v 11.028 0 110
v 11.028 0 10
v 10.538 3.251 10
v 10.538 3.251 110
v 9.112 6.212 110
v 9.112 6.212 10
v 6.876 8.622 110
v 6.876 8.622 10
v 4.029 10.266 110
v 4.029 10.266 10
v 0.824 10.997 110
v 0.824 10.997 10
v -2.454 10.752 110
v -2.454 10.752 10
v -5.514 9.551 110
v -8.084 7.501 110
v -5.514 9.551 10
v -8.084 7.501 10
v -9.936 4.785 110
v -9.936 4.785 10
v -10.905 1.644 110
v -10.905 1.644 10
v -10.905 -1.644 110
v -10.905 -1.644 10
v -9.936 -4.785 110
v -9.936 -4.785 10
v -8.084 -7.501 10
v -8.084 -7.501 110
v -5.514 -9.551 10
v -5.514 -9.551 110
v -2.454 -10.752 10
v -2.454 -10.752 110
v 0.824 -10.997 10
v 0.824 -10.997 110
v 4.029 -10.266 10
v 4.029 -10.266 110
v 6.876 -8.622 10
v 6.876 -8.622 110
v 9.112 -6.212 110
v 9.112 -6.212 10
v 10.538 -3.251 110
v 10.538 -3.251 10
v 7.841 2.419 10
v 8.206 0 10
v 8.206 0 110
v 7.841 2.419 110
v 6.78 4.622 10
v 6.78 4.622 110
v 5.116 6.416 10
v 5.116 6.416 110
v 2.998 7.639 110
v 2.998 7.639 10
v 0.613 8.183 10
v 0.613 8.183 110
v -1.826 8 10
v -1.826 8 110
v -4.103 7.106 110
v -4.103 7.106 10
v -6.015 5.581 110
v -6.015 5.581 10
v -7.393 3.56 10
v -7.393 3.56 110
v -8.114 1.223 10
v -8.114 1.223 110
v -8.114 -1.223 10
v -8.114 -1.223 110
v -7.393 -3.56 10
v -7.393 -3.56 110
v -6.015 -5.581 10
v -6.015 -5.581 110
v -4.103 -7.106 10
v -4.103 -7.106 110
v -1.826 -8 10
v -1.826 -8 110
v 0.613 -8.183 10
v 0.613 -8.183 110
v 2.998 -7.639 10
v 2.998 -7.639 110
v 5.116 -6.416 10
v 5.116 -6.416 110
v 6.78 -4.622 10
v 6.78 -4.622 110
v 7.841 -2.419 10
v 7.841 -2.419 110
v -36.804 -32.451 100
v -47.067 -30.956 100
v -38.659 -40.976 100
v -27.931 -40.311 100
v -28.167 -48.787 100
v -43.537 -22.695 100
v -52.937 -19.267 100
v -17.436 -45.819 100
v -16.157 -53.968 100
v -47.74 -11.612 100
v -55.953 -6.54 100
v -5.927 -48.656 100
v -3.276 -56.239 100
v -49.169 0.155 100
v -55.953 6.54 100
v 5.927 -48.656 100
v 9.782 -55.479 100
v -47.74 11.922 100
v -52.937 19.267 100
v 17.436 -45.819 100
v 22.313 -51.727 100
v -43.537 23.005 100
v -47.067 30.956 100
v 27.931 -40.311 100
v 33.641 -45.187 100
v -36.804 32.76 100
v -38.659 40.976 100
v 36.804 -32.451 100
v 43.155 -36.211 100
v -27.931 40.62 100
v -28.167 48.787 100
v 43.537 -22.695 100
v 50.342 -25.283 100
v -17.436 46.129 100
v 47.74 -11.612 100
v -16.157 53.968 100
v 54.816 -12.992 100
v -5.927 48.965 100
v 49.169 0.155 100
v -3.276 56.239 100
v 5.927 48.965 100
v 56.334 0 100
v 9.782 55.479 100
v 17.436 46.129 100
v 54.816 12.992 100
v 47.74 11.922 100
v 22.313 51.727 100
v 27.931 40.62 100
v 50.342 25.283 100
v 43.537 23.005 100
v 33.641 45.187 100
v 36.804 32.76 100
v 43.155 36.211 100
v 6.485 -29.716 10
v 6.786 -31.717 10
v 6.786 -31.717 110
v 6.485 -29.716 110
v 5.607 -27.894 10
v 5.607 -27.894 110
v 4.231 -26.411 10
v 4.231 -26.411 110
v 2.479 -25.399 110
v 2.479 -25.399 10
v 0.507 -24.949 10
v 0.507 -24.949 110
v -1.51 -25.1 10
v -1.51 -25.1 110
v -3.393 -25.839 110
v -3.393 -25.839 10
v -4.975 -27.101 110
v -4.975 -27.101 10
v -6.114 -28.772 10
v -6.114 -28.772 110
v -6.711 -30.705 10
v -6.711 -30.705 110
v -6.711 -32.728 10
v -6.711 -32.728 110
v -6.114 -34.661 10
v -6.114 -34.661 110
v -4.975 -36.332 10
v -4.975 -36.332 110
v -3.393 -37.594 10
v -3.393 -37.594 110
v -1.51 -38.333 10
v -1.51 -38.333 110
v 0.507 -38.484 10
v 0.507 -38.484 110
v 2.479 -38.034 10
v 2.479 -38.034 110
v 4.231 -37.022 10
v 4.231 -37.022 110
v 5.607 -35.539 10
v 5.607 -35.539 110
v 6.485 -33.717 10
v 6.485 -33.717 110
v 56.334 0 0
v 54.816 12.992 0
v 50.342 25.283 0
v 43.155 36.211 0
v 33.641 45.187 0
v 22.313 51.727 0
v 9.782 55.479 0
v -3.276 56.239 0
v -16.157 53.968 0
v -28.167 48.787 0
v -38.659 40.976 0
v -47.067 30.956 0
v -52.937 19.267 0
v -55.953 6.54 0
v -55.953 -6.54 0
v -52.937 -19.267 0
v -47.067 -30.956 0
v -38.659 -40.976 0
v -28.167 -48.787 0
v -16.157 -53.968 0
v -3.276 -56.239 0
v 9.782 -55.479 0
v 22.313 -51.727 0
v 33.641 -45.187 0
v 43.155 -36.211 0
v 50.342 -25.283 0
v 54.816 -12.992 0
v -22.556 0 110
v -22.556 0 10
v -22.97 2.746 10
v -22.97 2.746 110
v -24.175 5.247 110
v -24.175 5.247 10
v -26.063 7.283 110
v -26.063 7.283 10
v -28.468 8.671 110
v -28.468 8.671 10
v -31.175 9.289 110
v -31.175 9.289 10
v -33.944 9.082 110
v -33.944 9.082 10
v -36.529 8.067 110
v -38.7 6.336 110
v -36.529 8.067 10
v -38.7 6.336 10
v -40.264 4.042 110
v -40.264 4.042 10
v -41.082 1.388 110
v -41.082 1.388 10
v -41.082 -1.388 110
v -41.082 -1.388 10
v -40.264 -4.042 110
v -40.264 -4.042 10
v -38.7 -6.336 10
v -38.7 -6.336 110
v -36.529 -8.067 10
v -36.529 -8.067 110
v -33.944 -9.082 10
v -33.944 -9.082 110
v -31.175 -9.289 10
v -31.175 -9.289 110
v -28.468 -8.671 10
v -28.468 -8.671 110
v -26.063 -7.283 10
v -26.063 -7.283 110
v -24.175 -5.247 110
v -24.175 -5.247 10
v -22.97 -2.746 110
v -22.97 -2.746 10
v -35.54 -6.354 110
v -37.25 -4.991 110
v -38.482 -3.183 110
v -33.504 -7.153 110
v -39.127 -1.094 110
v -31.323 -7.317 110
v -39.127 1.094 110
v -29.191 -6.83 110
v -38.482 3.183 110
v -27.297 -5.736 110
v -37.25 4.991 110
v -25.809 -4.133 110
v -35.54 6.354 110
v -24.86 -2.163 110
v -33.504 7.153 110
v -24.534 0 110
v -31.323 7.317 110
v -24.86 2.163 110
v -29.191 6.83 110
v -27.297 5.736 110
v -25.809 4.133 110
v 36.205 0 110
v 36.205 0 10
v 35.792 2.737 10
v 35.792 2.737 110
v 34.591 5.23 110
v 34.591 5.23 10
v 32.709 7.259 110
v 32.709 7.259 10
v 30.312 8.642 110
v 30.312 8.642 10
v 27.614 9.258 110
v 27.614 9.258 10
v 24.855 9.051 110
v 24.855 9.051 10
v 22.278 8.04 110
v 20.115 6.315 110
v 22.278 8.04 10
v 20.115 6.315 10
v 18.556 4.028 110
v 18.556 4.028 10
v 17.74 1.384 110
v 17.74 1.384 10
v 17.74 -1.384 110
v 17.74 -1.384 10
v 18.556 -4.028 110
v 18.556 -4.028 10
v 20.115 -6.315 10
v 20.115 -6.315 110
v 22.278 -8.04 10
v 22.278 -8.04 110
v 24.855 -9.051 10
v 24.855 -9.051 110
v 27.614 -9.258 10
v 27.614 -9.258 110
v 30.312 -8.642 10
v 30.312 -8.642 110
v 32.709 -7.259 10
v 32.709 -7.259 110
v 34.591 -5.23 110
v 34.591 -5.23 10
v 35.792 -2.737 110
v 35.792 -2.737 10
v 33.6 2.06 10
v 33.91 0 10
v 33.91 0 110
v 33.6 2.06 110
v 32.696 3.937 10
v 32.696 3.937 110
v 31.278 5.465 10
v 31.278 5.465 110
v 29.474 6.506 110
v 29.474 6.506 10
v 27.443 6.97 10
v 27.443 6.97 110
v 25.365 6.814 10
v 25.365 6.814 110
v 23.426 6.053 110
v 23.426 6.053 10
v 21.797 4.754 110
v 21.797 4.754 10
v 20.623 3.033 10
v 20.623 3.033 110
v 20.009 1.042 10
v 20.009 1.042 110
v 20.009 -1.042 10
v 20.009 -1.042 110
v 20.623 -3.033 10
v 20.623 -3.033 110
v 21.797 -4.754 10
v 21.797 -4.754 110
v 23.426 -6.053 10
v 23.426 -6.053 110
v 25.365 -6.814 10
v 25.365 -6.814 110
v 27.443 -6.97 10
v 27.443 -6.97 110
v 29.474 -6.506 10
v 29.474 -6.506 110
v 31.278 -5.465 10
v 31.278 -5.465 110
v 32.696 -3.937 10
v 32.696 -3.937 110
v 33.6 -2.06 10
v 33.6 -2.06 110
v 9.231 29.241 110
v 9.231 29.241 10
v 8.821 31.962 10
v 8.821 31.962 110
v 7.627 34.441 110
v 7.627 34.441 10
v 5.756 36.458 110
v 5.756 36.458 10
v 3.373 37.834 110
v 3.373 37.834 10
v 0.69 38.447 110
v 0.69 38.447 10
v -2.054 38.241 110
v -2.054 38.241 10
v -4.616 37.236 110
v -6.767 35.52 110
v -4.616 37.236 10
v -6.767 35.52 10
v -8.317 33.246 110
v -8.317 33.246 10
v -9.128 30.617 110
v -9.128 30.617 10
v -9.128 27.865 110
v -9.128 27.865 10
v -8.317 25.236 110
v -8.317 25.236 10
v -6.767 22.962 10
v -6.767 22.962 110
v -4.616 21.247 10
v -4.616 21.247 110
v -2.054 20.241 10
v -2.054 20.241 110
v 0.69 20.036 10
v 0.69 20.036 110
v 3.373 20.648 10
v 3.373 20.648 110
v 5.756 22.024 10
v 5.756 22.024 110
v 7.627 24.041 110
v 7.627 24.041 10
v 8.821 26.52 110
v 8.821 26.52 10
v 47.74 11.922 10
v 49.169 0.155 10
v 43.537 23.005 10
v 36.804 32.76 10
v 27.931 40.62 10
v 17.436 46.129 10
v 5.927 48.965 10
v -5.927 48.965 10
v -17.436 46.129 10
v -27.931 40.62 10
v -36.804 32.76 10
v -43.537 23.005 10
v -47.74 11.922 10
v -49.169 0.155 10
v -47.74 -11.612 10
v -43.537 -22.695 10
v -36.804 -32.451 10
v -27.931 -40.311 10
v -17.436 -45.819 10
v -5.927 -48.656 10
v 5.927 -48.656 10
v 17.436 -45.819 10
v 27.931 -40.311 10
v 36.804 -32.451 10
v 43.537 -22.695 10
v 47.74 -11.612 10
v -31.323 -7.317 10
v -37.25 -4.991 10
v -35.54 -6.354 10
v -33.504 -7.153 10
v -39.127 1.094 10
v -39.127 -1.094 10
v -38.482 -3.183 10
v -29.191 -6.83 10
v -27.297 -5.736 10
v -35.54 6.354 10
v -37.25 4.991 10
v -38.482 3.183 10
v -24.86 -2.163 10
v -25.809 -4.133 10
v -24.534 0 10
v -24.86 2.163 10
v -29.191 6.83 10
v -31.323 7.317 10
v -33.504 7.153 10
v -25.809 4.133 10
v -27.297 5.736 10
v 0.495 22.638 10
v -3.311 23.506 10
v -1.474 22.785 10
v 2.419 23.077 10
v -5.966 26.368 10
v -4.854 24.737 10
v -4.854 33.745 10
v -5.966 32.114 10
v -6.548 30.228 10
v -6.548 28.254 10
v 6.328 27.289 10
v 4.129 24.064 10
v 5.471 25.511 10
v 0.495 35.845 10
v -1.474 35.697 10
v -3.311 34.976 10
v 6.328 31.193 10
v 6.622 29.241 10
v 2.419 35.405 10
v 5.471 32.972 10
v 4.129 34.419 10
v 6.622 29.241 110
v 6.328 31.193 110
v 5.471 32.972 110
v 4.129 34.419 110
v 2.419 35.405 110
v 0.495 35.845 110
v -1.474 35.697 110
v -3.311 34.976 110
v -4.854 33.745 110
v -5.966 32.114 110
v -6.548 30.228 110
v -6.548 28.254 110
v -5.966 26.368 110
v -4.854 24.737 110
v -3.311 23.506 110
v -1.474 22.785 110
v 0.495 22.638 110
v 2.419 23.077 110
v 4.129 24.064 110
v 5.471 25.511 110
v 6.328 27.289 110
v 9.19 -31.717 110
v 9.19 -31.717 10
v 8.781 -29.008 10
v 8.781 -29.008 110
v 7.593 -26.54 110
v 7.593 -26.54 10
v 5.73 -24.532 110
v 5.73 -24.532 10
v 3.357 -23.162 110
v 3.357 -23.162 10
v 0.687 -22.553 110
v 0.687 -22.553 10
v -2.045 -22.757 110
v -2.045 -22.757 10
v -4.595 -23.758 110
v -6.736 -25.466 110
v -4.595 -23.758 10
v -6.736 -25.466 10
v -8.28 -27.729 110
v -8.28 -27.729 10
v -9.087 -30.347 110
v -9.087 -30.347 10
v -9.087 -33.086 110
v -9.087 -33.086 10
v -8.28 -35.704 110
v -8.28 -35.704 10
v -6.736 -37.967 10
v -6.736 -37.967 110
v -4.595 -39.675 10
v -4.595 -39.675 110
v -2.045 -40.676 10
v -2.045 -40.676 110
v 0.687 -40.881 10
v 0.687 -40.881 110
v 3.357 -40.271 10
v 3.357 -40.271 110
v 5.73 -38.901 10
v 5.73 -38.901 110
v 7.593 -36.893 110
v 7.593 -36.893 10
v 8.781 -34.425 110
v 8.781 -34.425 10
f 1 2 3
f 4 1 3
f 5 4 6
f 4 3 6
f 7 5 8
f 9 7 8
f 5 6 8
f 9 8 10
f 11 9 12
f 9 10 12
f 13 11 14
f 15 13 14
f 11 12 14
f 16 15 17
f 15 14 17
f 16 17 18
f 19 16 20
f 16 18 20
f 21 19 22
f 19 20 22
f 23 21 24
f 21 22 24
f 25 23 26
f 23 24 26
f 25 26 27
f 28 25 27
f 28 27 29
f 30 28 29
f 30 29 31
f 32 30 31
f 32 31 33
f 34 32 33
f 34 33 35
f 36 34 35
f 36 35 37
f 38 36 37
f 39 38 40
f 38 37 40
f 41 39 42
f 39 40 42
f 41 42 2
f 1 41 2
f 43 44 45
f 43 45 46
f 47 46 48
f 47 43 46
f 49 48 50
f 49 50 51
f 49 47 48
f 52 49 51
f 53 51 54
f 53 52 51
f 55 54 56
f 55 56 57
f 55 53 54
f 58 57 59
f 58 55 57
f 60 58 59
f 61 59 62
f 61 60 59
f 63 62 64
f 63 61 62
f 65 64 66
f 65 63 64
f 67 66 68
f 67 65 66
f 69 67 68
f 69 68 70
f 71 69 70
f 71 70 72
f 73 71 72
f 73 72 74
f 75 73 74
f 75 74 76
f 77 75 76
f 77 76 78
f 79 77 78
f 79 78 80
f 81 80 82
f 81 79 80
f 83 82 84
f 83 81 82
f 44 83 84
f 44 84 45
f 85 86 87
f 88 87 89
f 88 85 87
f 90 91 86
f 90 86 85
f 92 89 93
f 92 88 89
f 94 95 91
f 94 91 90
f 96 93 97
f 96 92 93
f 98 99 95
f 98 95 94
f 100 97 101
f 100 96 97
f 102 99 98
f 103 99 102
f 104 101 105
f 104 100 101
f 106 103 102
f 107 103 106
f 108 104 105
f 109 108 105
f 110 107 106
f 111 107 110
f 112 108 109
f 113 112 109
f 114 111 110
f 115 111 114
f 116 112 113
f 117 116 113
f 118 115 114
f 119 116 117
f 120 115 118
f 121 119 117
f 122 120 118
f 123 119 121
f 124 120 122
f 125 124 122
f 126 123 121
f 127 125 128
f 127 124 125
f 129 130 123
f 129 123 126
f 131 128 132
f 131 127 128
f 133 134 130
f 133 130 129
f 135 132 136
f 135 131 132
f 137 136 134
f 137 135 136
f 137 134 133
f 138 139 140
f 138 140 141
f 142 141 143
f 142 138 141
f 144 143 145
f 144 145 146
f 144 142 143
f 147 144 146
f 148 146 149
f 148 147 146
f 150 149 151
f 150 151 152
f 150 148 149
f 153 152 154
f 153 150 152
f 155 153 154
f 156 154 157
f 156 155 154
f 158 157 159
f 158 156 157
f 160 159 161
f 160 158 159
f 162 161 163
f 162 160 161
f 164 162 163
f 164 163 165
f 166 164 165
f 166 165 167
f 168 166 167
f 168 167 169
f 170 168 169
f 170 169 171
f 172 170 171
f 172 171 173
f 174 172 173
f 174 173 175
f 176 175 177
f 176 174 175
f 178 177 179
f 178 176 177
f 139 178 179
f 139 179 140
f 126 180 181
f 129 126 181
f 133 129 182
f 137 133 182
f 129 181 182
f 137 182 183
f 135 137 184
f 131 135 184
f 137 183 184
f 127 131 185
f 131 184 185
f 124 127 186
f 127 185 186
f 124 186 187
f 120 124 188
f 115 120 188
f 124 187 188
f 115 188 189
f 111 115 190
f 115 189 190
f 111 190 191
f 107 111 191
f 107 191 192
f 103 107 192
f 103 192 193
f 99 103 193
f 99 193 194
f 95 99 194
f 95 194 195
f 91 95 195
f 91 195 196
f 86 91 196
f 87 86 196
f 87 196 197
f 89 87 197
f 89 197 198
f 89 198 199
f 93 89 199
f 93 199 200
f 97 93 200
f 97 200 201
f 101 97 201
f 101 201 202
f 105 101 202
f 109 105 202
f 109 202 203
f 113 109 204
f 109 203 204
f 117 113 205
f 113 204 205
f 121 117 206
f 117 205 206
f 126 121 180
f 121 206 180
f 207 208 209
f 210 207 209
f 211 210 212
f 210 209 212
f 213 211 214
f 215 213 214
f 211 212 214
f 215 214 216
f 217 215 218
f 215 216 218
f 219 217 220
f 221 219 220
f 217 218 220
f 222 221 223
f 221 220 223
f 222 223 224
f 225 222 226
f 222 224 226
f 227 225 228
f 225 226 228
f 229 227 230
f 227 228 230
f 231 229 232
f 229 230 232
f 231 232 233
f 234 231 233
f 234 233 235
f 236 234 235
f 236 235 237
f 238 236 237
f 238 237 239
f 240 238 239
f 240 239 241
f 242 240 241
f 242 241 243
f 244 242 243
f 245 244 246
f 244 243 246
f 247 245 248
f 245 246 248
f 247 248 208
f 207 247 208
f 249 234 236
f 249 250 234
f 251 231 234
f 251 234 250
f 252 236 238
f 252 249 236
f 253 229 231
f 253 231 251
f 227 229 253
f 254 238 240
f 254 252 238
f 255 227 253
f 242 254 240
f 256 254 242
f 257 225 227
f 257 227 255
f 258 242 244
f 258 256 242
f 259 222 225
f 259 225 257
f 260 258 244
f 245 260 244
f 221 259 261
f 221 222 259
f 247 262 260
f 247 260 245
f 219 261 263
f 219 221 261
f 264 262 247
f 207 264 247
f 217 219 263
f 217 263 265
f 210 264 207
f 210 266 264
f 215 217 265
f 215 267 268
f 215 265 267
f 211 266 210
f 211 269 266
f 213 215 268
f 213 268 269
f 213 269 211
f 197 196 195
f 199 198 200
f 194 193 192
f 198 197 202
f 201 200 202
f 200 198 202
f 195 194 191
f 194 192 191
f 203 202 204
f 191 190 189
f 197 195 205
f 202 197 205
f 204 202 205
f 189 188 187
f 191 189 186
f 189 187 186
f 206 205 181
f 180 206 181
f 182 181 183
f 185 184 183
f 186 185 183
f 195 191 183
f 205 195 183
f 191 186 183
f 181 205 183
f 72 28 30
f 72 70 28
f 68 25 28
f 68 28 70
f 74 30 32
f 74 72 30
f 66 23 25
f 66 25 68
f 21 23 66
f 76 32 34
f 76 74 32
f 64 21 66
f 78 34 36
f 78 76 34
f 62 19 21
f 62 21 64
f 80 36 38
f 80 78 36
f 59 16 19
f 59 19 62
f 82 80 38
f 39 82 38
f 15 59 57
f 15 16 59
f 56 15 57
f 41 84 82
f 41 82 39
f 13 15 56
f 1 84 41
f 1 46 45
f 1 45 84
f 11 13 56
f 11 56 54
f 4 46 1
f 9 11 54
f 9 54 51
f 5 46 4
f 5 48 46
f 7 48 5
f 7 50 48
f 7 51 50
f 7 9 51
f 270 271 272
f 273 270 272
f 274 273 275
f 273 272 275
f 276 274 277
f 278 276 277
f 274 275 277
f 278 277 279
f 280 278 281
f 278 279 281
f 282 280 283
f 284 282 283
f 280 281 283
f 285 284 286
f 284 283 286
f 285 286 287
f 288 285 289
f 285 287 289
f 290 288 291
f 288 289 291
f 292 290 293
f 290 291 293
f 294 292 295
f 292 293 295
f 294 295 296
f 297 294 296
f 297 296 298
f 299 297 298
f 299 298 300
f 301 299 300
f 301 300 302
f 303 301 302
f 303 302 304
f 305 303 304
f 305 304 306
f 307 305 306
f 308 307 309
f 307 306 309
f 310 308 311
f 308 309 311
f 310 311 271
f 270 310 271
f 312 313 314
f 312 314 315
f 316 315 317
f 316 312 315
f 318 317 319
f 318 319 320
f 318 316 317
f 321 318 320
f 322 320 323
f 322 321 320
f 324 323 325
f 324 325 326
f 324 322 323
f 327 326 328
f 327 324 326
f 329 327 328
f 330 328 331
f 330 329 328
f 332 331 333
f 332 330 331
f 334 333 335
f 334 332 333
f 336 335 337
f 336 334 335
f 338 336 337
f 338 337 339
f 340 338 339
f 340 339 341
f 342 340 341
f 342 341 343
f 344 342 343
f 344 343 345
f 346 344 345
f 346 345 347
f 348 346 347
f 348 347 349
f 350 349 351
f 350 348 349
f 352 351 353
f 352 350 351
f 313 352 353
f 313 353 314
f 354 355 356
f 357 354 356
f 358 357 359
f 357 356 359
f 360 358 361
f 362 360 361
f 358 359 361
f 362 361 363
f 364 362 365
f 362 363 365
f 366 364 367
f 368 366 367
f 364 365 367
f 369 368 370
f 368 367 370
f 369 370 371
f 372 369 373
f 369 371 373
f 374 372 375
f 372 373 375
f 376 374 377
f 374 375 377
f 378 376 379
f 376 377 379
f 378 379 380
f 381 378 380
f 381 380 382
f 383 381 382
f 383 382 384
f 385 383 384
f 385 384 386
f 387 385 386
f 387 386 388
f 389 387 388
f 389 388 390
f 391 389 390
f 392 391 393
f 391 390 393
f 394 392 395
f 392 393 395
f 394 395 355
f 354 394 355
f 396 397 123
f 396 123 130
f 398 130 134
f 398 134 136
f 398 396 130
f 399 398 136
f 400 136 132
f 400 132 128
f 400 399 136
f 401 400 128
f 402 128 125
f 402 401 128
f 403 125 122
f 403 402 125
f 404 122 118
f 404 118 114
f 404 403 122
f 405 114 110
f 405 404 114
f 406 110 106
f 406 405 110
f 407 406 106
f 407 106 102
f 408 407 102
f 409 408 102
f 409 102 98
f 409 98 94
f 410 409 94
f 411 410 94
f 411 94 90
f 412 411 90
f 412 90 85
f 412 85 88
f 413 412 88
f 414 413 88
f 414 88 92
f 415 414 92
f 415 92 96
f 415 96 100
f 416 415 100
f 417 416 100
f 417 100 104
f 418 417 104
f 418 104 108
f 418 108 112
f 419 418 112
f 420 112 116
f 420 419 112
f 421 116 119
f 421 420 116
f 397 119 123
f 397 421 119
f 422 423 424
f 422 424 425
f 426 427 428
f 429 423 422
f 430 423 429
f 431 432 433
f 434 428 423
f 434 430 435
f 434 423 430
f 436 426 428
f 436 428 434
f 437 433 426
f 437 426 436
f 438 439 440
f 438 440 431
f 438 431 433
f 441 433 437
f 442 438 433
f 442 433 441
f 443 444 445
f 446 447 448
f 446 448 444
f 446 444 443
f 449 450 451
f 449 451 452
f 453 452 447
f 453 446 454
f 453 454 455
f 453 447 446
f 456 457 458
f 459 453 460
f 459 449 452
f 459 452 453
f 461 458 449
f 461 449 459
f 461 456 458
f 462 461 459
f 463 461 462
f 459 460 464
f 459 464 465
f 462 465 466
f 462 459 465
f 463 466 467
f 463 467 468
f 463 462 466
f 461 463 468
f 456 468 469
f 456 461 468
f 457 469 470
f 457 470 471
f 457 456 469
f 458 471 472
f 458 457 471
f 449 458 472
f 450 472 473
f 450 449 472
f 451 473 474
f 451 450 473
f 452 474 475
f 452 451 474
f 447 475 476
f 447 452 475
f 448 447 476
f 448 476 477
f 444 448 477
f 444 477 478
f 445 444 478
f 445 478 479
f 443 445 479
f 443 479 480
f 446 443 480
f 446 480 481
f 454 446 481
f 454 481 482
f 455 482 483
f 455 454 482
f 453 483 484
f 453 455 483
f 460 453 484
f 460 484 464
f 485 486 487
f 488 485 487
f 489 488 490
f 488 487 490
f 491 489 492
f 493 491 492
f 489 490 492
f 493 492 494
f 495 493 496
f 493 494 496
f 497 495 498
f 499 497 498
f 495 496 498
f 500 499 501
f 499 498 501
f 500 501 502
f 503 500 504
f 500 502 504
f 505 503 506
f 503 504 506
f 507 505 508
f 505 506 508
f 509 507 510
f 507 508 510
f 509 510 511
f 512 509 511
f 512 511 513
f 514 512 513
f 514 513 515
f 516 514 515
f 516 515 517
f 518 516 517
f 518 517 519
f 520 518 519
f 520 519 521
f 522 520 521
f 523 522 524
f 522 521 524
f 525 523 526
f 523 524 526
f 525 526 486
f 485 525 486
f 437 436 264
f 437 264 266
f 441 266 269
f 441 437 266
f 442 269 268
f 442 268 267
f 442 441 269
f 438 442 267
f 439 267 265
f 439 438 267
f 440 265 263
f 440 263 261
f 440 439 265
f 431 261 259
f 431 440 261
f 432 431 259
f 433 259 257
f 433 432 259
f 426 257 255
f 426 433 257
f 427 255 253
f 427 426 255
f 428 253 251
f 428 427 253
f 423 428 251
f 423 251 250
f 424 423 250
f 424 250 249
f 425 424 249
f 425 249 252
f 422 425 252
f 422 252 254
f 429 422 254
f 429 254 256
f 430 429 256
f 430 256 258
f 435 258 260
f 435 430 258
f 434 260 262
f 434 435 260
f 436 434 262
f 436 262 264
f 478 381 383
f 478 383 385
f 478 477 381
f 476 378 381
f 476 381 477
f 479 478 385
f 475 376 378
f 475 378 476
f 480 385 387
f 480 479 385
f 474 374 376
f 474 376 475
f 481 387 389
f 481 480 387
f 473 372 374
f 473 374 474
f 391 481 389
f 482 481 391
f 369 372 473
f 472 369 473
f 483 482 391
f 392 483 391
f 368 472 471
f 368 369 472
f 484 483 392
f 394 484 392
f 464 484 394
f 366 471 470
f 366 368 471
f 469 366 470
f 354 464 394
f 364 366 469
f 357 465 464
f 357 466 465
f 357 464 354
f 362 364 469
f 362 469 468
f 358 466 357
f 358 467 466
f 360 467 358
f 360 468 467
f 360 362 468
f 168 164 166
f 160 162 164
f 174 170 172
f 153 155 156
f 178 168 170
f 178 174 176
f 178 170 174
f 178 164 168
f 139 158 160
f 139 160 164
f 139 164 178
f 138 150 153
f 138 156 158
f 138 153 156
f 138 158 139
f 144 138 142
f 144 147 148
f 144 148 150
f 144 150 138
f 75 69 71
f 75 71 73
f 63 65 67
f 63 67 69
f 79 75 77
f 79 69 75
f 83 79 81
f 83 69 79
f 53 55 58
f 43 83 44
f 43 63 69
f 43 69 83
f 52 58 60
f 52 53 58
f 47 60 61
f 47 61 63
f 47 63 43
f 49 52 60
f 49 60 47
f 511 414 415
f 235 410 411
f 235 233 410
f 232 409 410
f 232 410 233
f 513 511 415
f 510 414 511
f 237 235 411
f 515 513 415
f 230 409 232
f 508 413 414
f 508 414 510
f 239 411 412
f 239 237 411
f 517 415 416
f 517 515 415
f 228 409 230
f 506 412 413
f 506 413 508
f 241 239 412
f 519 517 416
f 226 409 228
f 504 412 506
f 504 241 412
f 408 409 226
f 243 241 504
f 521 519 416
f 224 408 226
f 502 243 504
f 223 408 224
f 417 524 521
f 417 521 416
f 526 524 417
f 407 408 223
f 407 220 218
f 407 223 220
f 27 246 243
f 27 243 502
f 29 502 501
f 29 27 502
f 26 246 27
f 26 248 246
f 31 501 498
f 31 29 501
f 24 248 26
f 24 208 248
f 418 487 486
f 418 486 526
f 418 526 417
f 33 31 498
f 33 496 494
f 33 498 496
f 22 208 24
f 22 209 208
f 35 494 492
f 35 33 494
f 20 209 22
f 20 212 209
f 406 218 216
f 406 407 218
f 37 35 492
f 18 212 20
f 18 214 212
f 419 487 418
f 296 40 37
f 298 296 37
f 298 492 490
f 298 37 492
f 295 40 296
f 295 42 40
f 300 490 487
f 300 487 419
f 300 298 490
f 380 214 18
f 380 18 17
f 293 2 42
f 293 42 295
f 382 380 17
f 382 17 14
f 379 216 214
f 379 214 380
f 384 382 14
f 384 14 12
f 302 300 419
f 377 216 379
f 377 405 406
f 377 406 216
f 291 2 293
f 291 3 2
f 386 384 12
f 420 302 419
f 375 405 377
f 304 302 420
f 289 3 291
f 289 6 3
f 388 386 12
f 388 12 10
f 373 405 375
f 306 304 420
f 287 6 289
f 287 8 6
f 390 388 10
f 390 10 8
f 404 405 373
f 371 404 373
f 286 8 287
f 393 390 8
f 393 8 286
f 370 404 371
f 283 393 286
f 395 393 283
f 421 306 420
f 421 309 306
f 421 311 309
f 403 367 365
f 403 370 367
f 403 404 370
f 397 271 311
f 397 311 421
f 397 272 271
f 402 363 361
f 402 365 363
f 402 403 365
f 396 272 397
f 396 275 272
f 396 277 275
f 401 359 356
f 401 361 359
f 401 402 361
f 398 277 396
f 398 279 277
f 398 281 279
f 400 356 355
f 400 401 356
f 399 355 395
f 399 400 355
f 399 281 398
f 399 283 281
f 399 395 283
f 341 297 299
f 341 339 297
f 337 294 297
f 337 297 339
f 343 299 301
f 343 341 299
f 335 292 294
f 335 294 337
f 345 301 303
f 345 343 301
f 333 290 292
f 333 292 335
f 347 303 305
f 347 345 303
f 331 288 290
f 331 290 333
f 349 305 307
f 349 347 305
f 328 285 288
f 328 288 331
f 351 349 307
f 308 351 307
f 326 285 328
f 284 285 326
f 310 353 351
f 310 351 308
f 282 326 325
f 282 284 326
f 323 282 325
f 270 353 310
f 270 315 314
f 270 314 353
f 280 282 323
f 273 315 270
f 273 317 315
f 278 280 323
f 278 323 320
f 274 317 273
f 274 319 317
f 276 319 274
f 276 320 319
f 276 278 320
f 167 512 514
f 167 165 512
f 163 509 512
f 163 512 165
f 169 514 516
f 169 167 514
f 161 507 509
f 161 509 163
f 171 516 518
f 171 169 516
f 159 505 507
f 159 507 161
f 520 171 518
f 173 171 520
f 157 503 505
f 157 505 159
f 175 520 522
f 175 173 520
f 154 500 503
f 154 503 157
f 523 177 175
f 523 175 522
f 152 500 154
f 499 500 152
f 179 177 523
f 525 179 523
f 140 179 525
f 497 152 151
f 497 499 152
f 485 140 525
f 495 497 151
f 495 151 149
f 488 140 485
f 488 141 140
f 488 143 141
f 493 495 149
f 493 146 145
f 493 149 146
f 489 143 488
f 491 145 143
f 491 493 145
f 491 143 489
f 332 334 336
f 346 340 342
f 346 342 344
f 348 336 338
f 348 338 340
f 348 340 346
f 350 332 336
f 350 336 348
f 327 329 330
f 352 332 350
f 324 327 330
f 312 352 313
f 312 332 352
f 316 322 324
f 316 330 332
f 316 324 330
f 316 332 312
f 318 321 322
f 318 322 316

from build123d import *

# Parameters (mm, degrees)
F0_R     = 56.334368
F0_R_2   = 49.169238
F1_DEPTH = 100
F3_DEPTH = 25
F4_DEPTH = 10
F5_R     = 11.028269
F5_R_2   = 8.205737
F5_R_3   = 9.231192
F5_R_4   = 6.622097
F5_R_5   = 9.284198
F5_R_6   = 6.989631
F5_R_7   = 9.315085
F5_R_8   = 7.337153
F5_R_9   = 9.189609
F5_R_10  = 6.786331
F6_DEPTH = 100


with BuildPart() as f1:
    # F0 (on Top) → F1 (new body)
    with BuildSketch(Plane.XY):
        Circle(F0_R)
        with Locations((0, 0.154715)):
            Circle(F0_R_2, mode=Mode.SUBTRACT)
    extrude(amount=F1_DEPTH)

    # F0 (on Top) → F3 (join)
    with BuildSketch(Plane.XY):
        Circle(F0_R)
        with Locations((0, 0.154715)):
            Circle(F0_R_2, mode=Mode.SUBTRACT)
    extrude(amount=F3_DEPTH)

    # F0 (on Top) → F4 (join)
    with BuildSketch(Plane.XY):
        with Locations((0, 0.154715)):
            Circle(F0_R_2)
    extrude(amount=F4_DEPTH)

    # F5 (on face) → F6 (join)
    with BuildSketch(Plane.XY.offset(10)):
        Circle(F5_R)
        Circle(F5_R_2, mode=Mode.SUBTRACT)
        with Locations((0, 29.241161)):
            Circle(F5_R_3)
        with Locations((0, 29.241161)):
            Circle(F5_R_4, mode=Mode.SUBTRACT)
        with Locations((26.920432, 0)):
            Circle(F5_R_5)
        with Locations((26.920432, 0)):
            Circle(F5_R_6, mode=Mode.SUBTRACT)
        with Locations((-31.871319, 0)):
            Circle(F5_R_7)
        with Locations((-31.871319, 0)):
            Circle(F5_R_8, mode=Mode.SUBTRACT)
        with Locations((0, -31.716604)):
            Circle(F5_R_9)
        with Locations((0, -31.716604)):
            Circle(F5_R_10, mode=Mode.SUBTRACT)
    extrude(amount=F6_DEPTH)


solid = f1.part
